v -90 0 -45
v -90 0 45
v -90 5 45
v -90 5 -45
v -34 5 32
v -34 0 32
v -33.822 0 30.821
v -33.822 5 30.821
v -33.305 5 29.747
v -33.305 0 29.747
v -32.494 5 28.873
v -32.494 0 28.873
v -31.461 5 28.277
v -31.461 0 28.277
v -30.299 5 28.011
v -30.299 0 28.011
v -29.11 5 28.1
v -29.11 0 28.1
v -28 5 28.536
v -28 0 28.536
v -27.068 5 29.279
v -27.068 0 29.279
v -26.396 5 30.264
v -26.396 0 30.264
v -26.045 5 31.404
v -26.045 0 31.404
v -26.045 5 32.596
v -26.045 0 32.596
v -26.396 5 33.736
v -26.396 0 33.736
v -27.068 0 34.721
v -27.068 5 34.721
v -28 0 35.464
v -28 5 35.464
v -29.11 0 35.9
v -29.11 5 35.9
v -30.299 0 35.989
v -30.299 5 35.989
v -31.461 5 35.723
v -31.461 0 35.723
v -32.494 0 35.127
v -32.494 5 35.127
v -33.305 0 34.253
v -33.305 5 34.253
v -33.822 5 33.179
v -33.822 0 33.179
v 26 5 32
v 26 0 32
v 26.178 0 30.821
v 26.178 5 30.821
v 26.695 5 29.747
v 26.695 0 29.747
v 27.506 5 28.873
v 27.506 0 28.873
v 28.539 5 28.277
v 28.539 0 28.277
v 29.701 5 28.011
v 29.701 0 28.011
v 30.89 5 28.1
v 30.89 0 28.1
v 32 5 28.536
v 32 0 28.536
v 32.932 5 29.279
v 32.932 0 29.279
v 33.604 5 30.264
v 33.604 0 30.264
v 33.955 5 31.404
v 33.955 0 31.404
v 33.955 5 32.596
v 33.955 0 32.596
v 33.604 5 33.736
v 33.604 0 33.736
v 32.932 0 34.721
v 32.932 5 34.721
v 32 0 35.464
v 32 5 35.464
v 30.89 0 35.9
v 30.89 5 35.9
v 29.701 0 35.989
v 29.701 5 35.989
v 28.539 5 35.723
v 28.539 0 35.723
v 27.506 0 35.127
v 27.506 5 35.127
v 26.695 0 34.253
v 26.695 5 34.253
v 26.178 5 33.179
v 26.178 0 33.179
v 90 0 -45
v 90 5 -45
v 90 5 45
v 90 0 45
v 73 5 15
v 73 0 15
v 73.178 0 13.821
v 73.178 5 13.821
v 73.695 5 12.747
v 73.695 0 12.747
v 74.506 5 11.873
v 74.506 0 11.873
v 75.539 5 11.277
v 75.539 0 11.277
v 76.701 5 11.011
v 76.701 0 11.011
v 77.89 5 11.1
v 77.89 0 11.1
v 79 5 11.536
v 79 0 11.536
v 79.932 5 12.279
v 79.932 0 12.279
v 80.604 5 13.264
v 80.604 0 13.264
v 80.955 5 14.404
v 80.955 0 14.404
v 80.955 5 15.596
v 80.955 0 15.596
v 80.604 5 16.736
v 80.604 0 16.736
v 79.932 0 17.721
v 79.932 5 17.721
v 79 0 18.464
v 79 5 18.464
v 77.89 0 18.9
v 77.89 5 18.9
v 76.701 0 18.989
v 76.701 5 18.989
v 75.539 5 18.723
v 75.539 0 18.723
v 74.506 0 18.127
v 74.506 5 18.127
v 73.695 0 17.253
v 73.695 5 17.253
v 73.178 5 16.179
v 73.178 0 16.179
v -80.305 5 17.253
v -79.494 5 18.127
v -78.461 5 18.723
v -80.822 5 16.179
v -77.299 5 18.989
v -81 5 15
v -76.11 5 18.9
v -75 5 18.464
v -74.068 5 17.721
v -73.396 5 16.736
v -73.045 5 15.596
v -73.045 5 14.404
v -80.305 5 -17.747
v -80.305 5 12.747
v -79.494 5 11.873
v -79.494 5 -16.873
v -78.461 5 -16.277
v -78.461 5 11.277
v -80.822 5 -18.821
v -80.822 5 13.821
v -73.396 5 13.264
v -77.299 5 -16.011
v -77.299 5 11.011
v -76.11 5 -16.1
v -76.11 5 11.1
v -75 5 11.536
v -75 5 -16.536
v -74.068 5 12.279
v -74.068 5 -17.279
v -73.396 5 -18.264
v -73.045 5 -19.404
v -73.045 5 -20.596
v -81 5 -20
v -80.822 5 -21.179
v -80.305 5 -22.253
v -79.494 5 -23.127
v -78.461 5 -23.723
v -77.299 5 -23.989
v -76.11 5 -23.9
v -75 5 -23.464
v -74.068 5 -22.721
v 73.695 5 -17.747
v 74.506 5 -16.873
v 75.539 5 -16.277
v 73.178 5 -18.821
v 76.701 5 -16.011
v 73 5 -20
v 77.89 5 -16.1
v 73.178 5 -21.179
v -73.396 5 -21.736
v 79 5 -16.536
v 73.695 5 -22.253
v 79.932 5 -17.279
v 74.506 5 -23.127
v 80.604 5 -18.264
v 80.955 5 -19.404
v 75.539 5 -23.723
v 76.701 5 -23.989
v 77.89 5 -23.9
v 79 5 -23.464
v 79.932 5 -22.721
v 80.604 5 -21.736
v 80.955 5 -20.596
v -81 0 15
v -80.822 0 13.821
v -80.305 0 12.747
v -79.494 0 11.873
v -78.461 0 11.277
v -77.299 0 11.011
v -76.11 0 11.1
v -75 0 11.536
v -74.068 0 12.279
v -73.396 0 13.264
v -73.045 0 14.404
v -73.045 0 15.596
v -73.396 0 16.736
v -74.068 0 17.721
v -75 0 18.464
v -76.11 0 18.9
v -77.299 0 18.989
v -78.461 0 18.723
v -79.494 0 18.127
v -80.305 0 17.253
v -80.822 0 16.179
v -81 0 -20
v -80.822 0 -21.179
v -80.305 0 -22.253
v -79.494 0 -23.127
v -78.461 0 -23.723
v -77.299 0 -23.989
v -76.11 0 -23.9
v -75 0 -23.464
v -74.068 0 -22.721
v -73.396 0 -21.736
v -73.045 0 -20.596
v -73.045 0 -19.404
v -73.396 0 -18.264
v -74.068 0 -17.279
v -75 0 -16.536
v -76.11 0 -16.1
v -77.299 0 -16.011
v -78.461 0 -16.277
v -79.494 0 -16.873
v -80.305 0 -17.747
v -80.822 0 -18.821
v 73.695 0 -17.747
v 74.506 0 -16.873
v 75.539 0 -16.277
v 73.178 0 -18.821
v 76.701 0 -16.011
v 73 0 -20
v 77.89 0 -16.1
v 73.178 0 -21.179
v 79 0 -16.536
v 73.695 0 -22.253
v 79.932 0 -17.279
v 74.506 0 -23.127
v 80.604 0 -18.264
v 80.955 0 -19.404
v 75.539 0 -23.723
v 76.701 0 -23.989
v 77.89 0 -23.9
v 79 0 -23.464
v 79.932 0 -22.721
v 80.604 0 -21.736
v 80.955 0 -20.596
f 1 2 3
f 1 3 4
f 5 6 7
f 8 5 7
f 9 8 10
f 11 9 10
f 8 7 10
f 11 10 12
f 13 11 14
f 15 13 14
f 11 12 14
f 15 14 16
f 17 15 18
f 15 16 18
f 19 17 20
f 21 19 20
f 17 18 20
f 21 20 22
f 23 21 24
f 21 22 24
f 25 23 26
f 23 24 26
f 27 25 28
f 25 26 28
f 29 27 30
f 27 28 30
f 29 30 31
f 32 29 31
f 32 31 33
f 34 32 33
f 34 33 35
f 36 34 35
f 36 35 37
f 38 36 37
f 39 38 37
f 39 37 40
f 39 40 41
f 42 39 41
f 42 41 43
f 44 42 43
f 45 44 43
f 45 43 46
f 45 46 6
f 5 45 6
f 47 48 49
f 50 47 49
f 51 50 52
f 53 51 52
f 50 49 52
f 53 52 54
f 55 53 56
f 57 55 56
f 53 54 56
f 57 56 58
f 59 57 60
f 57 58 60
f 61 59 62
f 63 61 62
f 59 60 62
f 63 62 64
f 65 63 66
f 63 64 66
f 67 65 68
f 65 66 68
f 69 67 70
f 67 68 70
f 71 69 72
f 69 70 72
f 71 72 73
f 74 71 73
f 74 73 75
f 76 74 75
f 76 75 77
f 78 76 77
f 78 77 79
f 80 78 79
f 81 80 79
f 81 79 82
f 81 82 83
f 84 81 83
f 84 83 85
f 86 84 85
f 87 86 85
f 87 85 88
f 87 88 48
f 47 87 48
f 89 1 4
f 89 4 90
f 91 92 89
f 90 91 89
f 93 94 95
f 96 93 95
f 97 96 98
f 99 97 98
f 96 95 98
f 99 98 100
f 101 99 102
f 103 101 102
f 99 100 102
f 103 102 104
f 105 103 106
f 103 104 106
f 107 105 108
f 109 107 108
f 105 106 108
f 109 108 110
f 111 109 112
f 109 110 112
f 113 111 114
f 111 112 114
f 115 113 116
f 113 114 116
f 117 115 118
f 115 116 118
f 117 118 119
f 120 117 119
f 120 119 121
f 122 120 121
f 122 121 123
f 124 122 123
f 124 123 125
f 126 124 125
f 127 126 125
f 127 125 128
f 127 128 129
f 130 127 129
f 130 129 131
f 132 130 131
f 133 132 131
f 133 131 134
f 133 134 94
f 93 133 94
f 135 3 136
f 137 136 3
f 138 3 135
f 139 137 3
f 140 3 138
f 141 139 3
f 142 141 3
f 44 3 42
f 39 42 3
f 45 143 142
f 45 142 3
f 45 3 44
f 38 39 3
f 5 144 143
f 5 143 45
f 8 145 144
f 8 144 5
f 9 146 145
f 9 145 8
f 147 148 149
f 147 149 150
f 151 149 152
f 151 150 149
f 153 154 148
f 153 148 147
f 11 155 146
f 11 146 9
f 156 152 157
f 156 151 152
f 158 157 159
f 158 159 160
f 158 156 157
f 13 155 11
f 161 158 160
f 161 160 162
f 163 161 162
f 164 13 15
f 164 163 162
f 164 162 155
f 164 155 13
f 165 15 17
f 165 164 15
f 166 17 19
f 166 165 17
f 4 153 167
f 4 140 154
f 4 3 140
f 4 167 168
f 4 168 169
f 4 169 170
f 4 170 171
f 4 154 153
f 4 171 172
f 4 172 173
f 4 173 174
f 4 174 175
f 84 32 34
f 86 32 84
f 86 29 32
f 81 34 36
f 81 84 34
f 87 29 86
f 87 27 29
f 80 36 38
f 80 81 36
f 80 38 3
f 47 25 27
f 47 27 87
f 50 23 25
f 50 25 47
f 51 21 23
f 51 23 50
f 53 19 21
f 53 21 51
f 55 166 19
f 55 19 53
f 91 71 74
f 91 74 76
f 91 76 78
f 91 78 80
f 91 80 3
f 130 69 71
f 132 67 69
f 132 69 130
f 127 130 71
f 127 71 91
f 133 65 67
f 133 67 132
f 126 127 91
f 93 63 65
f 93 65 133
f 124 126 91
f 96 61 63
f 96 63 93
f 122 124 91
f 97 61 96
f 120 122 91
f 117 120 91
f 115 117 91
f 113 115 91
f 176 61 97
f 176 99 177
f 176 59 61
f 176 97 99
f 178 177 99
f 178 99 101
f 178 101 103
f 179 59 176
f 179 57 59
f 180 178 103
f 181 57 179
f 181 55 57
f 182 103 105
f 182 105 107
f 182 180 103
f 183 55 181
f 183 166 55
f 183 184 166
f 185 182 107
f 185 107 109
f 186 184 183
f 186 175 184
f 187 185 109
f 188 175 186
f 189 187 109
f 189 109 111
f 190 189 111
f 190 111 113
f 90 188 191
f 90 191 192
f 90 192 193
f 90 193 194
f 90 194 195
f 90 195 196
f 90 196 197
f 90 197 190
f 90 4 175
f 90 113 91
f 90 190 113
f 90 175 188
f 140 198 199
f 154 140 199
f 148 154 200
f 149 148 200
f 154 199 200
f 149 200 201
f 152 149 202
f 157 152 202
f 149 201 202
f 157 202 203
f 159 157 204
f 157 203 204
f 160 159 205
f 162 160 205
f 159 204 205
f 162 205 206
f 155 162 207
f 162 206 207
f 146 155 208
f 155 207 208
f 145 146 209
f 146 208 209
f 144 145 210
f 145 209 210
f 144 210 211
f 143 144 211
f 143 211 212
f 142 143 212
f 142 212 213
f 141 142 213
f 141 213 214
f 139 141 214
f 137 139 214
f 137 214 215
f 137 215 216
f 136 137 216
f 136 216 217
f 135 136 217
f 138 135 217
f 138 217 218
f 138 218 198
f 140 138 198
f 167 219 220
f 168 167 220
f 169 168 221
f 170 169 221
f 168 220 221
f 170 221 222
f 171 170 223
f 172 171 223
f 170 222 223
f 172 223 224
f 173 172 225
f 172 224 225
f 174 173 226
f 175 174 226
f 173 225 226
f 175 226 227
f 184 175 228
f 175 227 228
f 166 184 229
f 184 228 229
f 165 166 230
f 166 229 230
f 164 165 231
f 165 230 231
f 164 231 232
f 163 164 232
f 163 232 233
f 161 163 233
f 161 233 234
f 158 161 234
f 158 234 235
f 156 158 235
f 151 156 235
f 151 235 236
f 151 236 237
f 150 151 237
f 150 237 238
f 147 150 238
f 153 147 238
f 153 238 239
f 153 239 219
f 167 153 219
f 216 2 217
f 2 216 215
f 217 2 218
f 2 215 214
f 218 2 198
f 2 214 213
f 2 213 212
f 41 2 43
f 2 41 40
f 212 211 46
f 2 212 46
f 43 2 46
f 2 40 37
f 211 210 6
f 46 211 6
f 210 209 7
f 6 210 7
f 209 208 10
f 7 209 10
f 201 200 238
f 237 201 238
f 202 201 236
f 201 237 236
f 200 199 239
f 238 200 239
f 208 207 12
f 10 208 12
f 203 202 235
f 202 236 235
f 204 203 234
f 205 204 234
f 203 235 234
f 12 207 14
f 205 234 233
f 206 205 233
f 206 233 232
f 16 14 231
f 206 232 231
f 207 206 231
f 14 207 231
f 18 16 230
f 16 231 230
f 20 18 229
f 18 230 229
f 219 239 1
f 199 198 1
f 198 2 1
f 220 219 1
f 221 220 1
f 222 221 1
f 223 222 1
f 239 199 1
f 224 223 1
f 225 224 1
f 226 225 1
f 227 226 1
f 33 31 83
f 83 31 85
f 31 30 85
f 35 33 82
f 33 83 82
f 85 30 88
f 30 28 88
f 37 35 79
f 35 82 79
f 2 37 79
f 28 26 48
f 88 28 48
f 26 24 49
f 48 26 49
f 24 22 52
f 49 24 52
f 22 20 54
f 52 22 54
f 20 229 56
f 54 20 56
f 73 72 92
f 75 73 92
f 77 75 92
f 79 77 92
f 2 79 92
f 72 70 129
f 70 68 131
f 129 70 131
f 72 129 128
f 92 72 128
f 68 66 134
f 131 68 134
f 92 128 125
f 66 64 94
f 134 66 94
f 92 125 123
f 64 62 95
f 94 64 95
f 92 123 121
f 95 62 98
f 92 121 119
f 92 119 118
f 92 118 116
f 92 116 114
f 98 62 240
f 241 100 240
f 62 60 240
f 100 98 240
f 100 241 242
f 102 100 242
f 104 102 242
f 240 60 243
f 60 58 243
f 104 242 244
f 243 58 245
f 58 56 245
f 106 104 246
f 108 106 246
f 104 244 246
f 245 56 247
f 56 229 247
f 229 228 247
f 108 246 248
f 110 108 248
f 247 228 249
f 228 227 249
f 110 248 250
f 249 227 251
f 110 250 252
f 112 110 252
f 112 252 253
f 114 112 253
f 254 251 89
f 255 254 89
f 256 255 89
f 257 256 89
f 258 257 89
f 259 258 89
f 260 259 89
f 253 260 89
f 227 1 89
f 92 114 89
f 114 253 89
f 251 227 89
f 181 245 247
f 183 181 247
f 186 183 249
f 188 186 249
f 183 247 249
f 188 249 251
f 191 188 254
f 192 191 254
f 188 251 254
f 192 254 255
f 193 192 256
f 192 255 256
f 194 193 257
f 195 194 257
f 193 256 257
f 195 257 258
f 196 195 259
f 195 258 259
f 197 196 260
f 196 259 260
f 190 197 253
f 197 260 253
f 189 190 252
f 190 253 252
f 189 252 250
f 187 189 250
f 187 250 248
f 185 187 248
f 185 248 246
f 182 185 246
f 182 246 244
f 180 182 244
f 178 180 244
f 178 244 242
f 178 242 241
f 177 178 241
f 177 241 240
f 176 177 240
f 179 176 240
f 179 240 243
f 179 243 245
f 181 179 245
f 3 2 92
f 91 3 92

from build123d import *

# Parameters (mm, degrees)
SKETCH1_W             = 180
SKETCH1_H             = 90
BOSS_EXTRUDE1_DEPTH   = 5
F_1_0MM_DOWEL_HOLE1_D = 8


with BuildPart() as part:
    # Sketch1 → Boss-Extrude1 (new body)
    with BuildSketch(Plane(origin=(0, 0, 0), x_dir=(1, 0, 0), z_dir=(0, 1, 0))):
        Rectangle(SKETCH1_W, SKETCH1_H)
    extrude(amount=BOSS_EXTRUDE1_DEPTH)

    # Ø1.0mm Dowel Hole1 (through all)
    with Locations(Plane(origin=(0, 5, 0), x_dir=(1, 0, 0), z_dir=(0, 1, 0))):
        with Locations((-77, 20), (-77, -15), (-30, -32), (30, -32), (77, -15), (77, 20)):
            Hole(F_1_0MM_DOWEL_HOLE1_D / 2)


solid = part.part
